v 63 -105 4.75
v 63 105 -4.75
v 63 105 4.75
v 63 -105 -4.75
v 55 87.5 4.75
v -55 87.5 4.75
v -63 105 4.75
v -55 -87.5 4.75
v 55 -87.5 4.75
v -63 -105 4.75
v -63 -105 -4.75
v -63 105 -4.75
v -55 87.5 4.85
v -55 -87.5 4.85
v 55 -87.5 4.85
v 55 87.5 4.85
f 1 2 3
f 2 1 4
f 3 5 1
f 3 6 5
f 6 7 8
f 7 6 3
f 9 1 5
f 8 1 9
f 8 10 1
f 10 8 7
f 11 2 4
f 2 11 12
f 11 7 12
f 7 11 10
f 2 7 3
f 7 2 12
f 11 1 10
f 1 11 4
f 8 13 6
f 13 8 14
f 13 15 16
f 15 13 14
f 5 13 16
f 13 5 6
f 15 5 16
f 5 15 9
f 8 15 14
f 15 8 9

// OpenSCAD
module tablet(){
    module tablet_cm(){
        total_dims = [12.6, 21, 0.95];
        screen_dims = [11, 17.5];
        color("LightBlue")cube(total_dims, center=true);
        color("Blue")translate([0,0, total_dims[2]/2])linear_extrude(height=0.01)square(screen_dims, center=true);   
    }
    scale([10,10,10])tablet_cm();
}
tablet();
